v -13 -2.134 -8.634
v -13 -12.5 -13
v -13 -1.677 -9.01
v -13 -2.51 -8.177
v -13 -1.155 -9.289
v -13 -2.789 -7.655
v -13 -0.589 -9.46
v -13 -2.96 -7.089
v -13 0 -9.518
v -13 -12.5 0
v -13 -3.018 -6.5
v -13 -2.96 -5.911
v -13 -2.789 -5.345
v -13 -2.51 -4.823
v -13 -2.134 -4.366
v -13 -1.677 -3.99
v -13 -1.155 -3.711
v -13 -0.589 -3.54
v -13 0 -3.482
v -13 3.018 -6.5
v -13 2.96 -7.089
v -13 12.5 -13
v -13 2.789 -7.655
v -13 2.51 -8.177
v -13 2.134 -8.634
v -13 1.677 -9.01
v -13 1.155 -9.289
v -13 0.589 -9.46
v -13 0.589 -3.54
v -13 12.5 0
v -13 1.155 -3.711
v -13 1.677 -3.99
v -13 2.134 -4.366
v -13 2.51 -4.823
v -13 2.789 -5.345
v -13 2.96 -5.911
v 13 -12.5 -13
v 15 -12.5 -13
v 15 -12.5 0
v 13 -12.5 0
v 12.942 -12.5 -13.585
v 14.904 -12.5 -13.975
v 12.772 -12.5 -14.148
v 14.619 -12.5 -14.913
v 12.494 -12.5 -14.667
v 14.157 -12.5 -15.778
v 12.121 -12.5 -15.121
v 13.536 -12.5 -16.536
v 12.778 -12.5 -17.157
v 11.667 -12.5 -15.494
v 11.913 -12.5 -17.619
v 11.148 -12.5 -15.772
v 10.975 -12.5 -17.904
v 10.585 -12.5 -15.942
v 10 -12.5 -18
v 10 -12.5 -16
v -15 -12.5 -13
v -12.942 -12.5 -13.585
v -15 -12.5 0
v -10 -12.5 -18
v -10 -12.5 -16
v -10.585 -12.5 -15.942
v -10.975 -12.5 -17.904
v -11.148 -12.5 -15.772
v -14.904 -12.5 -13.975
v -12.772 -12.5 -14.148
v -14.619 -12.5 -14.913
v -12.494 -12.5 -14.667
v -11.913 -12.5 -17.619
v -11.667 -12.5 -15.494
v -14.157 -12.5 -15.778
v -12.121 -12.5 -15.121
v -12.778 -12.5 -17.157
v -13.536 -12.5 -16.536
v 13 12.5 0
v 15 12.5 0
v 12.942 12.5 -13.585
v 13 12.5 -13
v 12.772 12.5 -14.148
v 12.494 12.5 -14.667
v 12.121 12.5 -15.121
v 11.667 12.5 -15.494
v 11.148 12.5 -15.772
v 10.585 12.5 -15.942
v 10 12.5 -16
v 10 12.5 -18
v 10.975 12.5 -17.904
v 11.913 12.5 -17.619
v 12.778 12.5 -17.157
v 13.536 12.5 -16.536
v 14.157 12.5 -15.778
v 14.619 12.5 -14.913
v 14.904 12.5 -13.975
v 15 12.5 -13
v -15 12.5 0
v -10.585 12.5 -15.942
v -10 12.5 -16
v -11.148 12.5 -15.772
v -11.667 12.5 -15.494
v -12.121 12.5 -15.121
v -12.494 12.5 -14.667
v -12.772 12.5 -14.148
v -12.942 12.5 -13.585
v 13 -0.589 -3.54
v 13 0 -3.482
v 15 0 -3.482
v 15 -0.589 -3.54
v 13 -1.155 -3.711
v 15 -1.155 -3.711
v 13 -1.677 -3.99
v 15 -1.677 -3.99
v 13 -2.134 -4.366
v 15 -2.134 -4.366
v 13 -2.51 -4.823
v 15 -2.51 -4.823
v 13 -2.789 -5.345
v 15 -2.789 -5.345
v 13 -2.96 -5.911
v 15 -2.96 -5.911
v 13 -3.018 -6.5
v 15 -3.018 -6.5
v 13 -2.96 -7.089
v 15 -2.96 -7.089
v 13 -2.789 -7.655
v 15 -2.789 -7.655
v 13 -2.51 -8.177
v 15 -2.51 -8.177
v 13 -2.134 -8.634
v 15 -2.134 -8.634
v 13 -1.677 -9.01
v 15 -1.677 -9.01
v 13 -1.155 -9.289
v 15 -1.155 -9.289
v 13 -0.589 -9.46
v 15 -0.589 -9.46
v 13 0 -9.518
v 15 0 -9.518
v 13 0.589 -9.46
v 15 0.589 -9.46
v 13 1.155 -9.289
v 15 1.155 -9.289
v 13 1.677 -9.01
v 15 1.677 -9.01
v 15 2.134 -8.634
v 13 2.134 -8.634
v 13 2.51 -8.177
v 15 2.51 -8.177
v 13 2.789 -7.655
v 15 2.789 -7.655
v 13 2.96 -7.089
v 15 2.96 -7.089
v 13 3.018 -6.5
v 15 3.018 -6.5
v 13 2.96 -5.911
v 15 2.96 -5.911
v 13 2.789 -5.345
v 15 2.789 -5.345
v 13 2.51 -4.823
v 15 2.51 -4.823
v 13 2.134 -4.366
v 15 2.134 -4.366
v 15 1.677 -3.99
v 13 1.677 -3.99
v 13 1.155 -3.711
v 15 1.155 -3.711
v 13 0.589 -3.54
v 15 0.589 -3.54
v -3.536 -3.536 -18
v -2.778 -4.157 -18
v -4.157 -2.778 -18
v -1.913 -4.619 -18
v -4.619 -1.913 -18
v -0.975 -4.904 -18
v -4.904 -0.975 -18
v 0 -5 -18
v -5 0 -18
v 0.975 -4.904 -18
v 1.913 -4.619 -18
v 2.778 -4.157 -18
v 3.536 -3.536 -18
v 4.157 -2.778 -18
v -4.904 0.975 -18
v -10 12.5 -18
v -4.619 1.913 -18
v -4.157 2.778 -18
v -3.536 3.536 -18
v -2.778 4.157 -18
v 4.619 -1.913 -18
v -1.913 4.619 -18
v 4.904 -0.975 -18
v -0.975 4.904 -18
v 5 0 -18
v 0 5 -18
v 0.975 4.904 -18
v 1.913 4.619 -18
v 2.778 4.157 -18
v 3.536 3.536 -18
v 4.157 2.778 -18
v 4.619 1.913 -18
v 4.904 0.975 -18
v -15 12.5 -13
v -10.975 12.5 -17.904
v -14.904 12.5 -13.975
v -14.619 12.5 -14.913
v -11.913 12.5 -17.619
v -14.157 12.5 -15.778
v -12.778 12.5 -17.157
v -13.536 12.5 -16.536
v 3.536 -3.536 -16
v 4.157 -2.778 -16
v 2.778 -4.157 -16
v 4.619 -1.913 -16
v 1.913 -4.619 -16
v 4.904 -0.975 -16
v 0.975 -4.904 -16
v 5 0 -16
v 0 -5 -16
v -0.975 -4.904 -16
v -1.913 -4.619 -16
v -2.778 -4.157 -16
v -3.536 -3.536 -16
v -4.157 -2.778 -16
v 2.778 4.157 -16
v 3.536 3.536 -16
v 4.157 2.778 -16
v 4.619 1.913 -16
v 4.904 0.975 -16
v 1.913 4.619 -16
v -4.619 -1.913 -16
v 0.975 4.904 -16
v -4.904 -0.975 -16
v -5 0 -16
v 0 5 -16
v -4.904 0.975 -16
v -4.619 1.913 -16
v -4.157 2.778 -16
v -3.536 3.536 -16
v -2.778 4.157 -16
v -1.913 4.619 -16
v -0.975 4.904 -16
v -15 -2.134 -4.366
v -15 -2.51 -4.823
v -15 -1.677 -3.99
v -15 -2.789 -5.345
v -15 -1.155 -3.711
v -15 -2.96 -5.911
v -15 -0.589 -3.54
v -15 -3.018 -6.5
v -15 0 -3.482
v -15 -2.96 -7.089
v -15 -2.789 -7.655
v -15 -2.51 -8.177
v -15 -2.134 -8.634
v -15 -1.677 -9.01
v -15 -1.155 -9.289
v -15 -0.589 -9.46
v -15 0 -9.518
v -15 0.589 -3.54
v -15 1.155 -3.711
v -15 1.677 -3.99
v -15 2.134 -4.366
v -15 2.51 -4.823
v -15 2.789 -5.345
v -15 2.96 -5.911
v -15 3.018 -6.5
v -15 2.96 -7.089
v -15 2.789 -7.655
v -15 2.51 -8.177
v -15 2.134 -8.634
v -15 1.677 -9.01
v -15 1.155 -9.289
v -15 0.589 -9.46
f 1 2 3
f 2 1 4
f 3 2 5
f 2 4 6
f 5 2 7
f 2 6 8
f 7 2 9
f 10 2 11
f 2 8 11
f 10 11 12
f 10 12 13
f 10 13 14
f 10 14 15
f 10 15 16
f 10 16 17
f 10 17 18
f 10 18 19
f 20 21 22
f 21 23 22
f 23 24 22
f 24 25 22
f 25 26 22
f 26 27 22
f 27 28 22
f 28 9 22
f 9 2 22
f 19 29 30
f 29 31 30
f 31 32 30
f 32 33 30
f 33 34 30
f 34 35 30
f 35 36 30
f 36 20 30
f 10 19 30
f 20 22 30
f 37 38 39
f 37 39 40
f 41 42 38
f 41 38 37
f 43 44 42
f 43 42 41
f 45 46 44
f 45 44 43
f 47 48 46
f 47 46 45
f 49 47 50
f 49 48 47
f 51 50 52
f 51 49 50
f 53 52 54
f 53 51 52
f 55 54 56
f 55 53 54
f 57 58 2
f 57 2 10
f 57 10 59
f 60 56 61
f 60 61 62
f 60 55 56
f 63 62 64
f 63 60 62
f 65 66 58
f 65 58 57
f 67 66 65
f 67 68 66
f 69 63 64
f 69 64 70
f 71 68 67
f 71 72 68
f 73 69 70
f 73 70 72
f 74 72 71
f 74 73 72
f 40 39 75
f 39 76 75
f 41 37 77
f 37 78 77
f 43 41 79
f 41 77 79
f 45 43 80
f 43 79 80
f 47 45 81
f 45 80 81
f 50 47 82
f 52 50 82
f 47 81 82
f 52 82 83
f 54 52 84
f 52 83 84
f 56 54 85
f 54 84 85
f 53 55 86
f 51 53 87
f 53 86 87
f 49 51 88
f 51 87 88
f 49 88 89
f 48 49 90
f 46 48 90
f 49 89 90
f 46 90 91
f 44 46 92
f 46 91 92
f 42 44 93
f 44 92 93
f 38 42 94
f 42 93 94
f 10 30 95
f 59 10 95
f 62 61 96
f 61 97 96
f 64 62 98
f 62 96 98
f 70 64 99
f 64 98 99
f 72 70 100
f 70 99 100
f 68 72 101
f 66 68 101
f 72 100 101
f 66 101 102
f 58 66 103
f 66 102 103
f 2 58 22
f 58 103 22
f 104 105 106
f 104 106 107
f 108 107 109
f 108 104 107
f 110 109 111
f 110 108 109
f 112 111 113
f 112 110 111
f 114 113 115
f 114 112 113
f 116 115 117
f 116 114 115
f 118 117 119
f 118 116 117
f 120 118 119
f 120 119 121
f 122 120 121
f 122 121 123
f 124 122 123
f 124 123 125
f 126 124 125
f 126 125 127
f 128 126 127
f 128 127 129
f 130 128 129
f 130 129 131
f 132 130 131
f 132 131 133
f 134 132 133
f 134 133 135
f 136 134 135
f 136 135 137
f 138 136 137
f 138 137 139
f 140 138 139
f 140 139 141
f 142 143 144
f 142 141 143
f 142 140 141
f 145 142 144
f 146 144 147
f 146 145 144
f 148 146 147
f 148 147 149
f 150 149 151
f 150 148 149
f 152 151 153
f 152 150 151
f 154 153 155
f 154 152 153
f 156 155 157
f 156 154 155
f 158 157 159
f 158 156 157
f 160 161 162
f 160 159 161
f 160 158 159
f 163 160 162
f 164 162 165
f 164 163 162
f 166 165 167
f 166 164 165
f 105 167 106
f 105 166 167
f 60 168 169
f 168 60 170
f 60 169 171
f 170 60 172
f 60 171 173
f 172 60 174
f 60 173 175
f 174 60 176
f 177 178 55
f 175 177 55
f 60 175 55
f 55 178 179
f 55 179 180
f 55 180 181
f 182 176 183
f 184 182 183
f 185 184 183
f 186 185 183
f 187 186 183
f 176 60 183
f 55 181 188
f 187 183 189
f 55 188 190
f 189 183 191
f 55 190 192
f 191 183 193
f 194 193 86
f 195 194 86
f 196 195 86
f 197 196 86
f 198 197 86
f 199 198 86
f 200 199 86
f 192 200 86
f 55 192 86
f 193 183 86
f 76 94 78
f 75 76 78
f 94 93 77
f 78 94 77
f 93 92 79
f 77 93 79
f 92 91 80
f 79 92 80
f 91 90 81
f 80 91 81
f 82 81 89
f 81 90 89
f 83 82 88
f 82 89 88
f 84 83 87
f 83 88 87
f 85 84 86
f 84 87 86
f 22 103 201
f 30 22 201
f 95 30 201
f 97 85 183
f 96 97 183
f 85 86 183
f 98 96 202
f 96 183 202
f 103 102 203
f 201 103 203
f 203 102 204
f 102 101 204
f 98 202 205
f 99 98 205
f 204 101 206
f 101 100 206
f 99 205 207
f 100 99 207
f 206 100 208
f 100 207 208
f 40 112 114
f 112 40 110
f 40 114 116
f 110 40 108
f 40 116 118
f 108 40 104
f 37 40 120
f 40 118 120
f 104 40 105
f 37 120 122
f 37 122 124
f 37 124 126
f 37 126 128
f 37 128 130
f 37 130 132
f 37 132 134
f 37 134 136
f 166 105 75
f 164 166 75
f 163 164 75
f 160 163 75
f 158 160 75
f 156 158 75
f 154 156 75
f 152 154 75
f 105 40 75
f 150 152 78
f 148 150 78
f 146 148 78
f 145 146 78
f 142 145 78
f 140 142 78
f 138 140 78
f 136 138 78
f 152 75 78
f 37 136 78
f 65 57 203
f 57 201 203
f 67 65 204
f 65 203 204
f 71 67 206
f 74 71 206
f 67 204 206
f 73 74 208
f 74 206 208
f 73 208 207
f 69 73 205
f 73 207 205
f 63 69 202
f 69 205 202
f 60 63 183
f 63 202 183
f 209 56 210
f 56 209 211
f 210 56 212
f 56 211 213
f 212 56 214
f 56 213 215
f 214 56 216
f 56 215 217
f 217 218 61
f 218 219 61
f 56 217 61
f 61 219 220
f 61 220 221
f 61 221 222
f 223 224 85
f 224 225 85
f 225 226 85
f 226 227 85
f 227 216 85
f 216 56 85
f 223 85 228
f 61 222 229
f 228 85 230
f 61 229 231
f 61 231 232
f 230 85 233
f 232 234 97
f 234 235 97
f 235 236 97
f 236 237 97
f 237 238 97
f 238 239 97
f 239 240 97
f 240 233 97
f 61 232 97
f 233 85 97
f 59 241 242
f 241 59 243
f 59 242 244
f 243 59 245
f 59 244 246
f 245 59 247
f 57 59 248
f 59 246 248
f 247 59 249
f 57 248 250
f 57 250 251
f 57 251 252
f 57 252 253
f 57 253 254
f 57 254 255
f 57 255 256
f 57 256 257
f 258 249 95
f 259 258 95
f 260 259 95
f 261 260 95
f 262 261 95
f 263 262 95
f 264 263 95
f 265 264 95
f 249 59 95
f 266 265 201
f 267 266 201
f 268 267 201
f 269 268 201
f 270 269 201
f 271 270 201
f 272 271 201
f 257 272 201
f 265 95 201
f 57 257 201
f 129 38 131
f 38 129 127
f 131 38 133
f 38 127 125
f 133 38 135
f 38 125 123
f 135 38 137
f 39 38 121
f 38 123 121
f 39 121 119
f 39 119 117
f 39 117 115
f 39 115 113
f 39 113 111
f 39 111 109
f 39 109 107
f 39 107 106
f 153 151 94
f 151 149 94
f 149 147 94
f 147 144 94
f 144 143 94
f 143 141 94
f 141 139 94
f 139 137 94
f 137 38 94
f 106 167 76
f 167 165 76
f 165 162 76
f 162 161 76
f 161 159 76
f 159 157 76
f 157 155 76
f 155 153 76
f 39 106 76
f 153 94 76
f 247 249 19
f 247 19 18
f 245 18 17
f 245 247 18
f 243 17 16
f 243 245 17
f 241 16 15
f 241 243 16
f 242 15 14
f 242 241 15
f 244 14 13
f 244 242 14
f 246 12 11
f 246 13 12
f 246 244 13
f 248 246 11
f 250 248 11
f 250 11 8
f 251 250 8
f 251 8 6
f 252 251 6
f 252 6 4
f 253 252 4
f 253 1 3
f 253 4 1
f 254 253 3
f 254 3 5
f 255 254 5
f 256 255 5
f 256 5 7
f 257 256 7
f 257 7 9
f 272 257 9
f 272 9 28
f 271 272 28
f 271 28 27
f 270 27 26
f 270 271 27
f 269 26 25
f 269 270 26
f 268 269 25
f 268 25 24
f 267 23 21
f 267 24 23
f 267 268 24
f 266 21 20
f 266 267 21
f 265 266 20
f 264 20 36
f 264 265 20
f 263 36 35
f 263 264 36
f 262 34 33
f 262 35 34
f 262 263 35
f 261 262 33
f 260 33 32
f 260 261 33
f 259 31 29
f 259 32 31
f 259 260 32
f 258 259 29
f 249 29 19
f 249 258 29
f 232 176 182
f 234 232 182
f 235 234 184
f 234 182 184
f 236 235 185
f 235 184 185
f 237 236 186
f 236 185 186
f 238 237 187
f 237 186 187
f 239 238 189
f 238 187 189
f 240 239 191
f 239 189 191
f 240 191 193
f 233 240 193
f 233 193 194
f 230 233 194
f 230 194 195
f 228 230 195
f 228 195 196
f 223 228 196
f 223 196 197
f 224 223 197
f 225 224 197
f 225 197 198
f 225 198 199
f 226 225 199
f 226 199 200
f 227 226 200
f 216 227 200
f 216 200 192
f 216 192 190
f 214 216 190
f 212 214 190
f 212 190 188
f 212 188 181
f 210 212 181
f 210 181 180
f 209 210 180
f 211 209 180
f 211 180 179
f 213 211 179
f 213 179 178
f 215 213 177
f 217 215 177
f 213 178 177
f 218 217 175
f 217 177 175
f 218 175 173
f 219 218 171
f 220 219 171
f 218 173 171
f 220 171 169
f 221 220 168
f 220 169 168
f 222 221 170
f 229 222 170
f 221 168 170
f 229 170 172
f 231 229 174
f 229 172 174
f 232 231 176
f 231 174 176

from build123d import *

# Parameters (mm, degrees)
BASE_FLANGE2_DEPTH      = 12.5
CUT_EXTRUDE2_DEPTH      = 38.151715977
CUT_EXTRUDE2_DEPTH_BACK = 38.151715977
SKETCH11_R              = 3.018390671
CUT_EXTRUDE3_REACH      = 28.557
SKETCH13_R              = 5


# Sheet-metal steps are written as plain solids
with BuildPart() as part:
    # Sketch2 → Base-Flange2 (new, symmetric)
    with BuildSketch(Plane(origin=(0, 0, 0), x_dir=(1, 0, 0), z_dir=(0, 1, 0))):
        with BuildLine():
            Line((-15, 0), (-15, 13))
            ThreePointArc((-15, 13), (-13.535533906, 16.535533906), (-10, 18))
            Line((-10, 18), (10, 18))
            ThreePointArc((10, 18), (13.535533906, 16.535533906), (15, 13))
            Line((15, 13), (15, 0))
            Line((15, 0), (13, 0))
            Line((13, 0), (13, 13))
            ThreePointArc((13, 13), (12.121320344, 15.121320344), (10, 16))
            Line((10, 16), (-10, 16))
            ThreePointArc((-10, 16), (-12.121320344, 15.121320344), (-13, 13))
            Line((-13, 13), (-13, 0))
            Line((-13, 0), (-15, 0))
        make_face()
    extrude(amount=BASE_FLANGE2_DEPTH, both=True)

    # Sketch11 → Cut-Extrude2 (cut, two sides: drawn at the far end of the back side and taken through both)
    with BuildSketch(Plane(origin=(15, 0, 0), x_dir=(0, 0, -1), z_dir=(1, 0, 0)).offset(-CUT_EXTRUDE2_DEPTH_BACK)):
        with Locations(Location((6.5, 0, 0), (0, 0, 180))):
            Circle(SKETCH11_R)
    extrude(amount=CUT_EXTRUDE2_DEPTH + CUT_EXTRUDE2_DEPTH_BACK, mode=Mode.SUBTRACT)

    # Sketch13 → Cut-Extrude3 (cut, up to next)
    with BuildSketch(Plane(origin=(0, 0, -18), x_dir=(-1, 0, 0), z_dir=(0, 0, -1)), mode=Mode.PRIVATE) as cut_extrude3_sk1:
        Circle(SKETCH13_R)
    cut_extrude3_tool1 = extrude(cut_extrude3_sk1.sketch, amount=-CUT_EXTRUDE3_REACH, mode=Mode.PRIVATE) & part.part
    add(cut_extrude3_tool1.solids().sort_by_distance((0, 0, -18))[0], mode=Mode.SUBTRACT)


solid = part.part
